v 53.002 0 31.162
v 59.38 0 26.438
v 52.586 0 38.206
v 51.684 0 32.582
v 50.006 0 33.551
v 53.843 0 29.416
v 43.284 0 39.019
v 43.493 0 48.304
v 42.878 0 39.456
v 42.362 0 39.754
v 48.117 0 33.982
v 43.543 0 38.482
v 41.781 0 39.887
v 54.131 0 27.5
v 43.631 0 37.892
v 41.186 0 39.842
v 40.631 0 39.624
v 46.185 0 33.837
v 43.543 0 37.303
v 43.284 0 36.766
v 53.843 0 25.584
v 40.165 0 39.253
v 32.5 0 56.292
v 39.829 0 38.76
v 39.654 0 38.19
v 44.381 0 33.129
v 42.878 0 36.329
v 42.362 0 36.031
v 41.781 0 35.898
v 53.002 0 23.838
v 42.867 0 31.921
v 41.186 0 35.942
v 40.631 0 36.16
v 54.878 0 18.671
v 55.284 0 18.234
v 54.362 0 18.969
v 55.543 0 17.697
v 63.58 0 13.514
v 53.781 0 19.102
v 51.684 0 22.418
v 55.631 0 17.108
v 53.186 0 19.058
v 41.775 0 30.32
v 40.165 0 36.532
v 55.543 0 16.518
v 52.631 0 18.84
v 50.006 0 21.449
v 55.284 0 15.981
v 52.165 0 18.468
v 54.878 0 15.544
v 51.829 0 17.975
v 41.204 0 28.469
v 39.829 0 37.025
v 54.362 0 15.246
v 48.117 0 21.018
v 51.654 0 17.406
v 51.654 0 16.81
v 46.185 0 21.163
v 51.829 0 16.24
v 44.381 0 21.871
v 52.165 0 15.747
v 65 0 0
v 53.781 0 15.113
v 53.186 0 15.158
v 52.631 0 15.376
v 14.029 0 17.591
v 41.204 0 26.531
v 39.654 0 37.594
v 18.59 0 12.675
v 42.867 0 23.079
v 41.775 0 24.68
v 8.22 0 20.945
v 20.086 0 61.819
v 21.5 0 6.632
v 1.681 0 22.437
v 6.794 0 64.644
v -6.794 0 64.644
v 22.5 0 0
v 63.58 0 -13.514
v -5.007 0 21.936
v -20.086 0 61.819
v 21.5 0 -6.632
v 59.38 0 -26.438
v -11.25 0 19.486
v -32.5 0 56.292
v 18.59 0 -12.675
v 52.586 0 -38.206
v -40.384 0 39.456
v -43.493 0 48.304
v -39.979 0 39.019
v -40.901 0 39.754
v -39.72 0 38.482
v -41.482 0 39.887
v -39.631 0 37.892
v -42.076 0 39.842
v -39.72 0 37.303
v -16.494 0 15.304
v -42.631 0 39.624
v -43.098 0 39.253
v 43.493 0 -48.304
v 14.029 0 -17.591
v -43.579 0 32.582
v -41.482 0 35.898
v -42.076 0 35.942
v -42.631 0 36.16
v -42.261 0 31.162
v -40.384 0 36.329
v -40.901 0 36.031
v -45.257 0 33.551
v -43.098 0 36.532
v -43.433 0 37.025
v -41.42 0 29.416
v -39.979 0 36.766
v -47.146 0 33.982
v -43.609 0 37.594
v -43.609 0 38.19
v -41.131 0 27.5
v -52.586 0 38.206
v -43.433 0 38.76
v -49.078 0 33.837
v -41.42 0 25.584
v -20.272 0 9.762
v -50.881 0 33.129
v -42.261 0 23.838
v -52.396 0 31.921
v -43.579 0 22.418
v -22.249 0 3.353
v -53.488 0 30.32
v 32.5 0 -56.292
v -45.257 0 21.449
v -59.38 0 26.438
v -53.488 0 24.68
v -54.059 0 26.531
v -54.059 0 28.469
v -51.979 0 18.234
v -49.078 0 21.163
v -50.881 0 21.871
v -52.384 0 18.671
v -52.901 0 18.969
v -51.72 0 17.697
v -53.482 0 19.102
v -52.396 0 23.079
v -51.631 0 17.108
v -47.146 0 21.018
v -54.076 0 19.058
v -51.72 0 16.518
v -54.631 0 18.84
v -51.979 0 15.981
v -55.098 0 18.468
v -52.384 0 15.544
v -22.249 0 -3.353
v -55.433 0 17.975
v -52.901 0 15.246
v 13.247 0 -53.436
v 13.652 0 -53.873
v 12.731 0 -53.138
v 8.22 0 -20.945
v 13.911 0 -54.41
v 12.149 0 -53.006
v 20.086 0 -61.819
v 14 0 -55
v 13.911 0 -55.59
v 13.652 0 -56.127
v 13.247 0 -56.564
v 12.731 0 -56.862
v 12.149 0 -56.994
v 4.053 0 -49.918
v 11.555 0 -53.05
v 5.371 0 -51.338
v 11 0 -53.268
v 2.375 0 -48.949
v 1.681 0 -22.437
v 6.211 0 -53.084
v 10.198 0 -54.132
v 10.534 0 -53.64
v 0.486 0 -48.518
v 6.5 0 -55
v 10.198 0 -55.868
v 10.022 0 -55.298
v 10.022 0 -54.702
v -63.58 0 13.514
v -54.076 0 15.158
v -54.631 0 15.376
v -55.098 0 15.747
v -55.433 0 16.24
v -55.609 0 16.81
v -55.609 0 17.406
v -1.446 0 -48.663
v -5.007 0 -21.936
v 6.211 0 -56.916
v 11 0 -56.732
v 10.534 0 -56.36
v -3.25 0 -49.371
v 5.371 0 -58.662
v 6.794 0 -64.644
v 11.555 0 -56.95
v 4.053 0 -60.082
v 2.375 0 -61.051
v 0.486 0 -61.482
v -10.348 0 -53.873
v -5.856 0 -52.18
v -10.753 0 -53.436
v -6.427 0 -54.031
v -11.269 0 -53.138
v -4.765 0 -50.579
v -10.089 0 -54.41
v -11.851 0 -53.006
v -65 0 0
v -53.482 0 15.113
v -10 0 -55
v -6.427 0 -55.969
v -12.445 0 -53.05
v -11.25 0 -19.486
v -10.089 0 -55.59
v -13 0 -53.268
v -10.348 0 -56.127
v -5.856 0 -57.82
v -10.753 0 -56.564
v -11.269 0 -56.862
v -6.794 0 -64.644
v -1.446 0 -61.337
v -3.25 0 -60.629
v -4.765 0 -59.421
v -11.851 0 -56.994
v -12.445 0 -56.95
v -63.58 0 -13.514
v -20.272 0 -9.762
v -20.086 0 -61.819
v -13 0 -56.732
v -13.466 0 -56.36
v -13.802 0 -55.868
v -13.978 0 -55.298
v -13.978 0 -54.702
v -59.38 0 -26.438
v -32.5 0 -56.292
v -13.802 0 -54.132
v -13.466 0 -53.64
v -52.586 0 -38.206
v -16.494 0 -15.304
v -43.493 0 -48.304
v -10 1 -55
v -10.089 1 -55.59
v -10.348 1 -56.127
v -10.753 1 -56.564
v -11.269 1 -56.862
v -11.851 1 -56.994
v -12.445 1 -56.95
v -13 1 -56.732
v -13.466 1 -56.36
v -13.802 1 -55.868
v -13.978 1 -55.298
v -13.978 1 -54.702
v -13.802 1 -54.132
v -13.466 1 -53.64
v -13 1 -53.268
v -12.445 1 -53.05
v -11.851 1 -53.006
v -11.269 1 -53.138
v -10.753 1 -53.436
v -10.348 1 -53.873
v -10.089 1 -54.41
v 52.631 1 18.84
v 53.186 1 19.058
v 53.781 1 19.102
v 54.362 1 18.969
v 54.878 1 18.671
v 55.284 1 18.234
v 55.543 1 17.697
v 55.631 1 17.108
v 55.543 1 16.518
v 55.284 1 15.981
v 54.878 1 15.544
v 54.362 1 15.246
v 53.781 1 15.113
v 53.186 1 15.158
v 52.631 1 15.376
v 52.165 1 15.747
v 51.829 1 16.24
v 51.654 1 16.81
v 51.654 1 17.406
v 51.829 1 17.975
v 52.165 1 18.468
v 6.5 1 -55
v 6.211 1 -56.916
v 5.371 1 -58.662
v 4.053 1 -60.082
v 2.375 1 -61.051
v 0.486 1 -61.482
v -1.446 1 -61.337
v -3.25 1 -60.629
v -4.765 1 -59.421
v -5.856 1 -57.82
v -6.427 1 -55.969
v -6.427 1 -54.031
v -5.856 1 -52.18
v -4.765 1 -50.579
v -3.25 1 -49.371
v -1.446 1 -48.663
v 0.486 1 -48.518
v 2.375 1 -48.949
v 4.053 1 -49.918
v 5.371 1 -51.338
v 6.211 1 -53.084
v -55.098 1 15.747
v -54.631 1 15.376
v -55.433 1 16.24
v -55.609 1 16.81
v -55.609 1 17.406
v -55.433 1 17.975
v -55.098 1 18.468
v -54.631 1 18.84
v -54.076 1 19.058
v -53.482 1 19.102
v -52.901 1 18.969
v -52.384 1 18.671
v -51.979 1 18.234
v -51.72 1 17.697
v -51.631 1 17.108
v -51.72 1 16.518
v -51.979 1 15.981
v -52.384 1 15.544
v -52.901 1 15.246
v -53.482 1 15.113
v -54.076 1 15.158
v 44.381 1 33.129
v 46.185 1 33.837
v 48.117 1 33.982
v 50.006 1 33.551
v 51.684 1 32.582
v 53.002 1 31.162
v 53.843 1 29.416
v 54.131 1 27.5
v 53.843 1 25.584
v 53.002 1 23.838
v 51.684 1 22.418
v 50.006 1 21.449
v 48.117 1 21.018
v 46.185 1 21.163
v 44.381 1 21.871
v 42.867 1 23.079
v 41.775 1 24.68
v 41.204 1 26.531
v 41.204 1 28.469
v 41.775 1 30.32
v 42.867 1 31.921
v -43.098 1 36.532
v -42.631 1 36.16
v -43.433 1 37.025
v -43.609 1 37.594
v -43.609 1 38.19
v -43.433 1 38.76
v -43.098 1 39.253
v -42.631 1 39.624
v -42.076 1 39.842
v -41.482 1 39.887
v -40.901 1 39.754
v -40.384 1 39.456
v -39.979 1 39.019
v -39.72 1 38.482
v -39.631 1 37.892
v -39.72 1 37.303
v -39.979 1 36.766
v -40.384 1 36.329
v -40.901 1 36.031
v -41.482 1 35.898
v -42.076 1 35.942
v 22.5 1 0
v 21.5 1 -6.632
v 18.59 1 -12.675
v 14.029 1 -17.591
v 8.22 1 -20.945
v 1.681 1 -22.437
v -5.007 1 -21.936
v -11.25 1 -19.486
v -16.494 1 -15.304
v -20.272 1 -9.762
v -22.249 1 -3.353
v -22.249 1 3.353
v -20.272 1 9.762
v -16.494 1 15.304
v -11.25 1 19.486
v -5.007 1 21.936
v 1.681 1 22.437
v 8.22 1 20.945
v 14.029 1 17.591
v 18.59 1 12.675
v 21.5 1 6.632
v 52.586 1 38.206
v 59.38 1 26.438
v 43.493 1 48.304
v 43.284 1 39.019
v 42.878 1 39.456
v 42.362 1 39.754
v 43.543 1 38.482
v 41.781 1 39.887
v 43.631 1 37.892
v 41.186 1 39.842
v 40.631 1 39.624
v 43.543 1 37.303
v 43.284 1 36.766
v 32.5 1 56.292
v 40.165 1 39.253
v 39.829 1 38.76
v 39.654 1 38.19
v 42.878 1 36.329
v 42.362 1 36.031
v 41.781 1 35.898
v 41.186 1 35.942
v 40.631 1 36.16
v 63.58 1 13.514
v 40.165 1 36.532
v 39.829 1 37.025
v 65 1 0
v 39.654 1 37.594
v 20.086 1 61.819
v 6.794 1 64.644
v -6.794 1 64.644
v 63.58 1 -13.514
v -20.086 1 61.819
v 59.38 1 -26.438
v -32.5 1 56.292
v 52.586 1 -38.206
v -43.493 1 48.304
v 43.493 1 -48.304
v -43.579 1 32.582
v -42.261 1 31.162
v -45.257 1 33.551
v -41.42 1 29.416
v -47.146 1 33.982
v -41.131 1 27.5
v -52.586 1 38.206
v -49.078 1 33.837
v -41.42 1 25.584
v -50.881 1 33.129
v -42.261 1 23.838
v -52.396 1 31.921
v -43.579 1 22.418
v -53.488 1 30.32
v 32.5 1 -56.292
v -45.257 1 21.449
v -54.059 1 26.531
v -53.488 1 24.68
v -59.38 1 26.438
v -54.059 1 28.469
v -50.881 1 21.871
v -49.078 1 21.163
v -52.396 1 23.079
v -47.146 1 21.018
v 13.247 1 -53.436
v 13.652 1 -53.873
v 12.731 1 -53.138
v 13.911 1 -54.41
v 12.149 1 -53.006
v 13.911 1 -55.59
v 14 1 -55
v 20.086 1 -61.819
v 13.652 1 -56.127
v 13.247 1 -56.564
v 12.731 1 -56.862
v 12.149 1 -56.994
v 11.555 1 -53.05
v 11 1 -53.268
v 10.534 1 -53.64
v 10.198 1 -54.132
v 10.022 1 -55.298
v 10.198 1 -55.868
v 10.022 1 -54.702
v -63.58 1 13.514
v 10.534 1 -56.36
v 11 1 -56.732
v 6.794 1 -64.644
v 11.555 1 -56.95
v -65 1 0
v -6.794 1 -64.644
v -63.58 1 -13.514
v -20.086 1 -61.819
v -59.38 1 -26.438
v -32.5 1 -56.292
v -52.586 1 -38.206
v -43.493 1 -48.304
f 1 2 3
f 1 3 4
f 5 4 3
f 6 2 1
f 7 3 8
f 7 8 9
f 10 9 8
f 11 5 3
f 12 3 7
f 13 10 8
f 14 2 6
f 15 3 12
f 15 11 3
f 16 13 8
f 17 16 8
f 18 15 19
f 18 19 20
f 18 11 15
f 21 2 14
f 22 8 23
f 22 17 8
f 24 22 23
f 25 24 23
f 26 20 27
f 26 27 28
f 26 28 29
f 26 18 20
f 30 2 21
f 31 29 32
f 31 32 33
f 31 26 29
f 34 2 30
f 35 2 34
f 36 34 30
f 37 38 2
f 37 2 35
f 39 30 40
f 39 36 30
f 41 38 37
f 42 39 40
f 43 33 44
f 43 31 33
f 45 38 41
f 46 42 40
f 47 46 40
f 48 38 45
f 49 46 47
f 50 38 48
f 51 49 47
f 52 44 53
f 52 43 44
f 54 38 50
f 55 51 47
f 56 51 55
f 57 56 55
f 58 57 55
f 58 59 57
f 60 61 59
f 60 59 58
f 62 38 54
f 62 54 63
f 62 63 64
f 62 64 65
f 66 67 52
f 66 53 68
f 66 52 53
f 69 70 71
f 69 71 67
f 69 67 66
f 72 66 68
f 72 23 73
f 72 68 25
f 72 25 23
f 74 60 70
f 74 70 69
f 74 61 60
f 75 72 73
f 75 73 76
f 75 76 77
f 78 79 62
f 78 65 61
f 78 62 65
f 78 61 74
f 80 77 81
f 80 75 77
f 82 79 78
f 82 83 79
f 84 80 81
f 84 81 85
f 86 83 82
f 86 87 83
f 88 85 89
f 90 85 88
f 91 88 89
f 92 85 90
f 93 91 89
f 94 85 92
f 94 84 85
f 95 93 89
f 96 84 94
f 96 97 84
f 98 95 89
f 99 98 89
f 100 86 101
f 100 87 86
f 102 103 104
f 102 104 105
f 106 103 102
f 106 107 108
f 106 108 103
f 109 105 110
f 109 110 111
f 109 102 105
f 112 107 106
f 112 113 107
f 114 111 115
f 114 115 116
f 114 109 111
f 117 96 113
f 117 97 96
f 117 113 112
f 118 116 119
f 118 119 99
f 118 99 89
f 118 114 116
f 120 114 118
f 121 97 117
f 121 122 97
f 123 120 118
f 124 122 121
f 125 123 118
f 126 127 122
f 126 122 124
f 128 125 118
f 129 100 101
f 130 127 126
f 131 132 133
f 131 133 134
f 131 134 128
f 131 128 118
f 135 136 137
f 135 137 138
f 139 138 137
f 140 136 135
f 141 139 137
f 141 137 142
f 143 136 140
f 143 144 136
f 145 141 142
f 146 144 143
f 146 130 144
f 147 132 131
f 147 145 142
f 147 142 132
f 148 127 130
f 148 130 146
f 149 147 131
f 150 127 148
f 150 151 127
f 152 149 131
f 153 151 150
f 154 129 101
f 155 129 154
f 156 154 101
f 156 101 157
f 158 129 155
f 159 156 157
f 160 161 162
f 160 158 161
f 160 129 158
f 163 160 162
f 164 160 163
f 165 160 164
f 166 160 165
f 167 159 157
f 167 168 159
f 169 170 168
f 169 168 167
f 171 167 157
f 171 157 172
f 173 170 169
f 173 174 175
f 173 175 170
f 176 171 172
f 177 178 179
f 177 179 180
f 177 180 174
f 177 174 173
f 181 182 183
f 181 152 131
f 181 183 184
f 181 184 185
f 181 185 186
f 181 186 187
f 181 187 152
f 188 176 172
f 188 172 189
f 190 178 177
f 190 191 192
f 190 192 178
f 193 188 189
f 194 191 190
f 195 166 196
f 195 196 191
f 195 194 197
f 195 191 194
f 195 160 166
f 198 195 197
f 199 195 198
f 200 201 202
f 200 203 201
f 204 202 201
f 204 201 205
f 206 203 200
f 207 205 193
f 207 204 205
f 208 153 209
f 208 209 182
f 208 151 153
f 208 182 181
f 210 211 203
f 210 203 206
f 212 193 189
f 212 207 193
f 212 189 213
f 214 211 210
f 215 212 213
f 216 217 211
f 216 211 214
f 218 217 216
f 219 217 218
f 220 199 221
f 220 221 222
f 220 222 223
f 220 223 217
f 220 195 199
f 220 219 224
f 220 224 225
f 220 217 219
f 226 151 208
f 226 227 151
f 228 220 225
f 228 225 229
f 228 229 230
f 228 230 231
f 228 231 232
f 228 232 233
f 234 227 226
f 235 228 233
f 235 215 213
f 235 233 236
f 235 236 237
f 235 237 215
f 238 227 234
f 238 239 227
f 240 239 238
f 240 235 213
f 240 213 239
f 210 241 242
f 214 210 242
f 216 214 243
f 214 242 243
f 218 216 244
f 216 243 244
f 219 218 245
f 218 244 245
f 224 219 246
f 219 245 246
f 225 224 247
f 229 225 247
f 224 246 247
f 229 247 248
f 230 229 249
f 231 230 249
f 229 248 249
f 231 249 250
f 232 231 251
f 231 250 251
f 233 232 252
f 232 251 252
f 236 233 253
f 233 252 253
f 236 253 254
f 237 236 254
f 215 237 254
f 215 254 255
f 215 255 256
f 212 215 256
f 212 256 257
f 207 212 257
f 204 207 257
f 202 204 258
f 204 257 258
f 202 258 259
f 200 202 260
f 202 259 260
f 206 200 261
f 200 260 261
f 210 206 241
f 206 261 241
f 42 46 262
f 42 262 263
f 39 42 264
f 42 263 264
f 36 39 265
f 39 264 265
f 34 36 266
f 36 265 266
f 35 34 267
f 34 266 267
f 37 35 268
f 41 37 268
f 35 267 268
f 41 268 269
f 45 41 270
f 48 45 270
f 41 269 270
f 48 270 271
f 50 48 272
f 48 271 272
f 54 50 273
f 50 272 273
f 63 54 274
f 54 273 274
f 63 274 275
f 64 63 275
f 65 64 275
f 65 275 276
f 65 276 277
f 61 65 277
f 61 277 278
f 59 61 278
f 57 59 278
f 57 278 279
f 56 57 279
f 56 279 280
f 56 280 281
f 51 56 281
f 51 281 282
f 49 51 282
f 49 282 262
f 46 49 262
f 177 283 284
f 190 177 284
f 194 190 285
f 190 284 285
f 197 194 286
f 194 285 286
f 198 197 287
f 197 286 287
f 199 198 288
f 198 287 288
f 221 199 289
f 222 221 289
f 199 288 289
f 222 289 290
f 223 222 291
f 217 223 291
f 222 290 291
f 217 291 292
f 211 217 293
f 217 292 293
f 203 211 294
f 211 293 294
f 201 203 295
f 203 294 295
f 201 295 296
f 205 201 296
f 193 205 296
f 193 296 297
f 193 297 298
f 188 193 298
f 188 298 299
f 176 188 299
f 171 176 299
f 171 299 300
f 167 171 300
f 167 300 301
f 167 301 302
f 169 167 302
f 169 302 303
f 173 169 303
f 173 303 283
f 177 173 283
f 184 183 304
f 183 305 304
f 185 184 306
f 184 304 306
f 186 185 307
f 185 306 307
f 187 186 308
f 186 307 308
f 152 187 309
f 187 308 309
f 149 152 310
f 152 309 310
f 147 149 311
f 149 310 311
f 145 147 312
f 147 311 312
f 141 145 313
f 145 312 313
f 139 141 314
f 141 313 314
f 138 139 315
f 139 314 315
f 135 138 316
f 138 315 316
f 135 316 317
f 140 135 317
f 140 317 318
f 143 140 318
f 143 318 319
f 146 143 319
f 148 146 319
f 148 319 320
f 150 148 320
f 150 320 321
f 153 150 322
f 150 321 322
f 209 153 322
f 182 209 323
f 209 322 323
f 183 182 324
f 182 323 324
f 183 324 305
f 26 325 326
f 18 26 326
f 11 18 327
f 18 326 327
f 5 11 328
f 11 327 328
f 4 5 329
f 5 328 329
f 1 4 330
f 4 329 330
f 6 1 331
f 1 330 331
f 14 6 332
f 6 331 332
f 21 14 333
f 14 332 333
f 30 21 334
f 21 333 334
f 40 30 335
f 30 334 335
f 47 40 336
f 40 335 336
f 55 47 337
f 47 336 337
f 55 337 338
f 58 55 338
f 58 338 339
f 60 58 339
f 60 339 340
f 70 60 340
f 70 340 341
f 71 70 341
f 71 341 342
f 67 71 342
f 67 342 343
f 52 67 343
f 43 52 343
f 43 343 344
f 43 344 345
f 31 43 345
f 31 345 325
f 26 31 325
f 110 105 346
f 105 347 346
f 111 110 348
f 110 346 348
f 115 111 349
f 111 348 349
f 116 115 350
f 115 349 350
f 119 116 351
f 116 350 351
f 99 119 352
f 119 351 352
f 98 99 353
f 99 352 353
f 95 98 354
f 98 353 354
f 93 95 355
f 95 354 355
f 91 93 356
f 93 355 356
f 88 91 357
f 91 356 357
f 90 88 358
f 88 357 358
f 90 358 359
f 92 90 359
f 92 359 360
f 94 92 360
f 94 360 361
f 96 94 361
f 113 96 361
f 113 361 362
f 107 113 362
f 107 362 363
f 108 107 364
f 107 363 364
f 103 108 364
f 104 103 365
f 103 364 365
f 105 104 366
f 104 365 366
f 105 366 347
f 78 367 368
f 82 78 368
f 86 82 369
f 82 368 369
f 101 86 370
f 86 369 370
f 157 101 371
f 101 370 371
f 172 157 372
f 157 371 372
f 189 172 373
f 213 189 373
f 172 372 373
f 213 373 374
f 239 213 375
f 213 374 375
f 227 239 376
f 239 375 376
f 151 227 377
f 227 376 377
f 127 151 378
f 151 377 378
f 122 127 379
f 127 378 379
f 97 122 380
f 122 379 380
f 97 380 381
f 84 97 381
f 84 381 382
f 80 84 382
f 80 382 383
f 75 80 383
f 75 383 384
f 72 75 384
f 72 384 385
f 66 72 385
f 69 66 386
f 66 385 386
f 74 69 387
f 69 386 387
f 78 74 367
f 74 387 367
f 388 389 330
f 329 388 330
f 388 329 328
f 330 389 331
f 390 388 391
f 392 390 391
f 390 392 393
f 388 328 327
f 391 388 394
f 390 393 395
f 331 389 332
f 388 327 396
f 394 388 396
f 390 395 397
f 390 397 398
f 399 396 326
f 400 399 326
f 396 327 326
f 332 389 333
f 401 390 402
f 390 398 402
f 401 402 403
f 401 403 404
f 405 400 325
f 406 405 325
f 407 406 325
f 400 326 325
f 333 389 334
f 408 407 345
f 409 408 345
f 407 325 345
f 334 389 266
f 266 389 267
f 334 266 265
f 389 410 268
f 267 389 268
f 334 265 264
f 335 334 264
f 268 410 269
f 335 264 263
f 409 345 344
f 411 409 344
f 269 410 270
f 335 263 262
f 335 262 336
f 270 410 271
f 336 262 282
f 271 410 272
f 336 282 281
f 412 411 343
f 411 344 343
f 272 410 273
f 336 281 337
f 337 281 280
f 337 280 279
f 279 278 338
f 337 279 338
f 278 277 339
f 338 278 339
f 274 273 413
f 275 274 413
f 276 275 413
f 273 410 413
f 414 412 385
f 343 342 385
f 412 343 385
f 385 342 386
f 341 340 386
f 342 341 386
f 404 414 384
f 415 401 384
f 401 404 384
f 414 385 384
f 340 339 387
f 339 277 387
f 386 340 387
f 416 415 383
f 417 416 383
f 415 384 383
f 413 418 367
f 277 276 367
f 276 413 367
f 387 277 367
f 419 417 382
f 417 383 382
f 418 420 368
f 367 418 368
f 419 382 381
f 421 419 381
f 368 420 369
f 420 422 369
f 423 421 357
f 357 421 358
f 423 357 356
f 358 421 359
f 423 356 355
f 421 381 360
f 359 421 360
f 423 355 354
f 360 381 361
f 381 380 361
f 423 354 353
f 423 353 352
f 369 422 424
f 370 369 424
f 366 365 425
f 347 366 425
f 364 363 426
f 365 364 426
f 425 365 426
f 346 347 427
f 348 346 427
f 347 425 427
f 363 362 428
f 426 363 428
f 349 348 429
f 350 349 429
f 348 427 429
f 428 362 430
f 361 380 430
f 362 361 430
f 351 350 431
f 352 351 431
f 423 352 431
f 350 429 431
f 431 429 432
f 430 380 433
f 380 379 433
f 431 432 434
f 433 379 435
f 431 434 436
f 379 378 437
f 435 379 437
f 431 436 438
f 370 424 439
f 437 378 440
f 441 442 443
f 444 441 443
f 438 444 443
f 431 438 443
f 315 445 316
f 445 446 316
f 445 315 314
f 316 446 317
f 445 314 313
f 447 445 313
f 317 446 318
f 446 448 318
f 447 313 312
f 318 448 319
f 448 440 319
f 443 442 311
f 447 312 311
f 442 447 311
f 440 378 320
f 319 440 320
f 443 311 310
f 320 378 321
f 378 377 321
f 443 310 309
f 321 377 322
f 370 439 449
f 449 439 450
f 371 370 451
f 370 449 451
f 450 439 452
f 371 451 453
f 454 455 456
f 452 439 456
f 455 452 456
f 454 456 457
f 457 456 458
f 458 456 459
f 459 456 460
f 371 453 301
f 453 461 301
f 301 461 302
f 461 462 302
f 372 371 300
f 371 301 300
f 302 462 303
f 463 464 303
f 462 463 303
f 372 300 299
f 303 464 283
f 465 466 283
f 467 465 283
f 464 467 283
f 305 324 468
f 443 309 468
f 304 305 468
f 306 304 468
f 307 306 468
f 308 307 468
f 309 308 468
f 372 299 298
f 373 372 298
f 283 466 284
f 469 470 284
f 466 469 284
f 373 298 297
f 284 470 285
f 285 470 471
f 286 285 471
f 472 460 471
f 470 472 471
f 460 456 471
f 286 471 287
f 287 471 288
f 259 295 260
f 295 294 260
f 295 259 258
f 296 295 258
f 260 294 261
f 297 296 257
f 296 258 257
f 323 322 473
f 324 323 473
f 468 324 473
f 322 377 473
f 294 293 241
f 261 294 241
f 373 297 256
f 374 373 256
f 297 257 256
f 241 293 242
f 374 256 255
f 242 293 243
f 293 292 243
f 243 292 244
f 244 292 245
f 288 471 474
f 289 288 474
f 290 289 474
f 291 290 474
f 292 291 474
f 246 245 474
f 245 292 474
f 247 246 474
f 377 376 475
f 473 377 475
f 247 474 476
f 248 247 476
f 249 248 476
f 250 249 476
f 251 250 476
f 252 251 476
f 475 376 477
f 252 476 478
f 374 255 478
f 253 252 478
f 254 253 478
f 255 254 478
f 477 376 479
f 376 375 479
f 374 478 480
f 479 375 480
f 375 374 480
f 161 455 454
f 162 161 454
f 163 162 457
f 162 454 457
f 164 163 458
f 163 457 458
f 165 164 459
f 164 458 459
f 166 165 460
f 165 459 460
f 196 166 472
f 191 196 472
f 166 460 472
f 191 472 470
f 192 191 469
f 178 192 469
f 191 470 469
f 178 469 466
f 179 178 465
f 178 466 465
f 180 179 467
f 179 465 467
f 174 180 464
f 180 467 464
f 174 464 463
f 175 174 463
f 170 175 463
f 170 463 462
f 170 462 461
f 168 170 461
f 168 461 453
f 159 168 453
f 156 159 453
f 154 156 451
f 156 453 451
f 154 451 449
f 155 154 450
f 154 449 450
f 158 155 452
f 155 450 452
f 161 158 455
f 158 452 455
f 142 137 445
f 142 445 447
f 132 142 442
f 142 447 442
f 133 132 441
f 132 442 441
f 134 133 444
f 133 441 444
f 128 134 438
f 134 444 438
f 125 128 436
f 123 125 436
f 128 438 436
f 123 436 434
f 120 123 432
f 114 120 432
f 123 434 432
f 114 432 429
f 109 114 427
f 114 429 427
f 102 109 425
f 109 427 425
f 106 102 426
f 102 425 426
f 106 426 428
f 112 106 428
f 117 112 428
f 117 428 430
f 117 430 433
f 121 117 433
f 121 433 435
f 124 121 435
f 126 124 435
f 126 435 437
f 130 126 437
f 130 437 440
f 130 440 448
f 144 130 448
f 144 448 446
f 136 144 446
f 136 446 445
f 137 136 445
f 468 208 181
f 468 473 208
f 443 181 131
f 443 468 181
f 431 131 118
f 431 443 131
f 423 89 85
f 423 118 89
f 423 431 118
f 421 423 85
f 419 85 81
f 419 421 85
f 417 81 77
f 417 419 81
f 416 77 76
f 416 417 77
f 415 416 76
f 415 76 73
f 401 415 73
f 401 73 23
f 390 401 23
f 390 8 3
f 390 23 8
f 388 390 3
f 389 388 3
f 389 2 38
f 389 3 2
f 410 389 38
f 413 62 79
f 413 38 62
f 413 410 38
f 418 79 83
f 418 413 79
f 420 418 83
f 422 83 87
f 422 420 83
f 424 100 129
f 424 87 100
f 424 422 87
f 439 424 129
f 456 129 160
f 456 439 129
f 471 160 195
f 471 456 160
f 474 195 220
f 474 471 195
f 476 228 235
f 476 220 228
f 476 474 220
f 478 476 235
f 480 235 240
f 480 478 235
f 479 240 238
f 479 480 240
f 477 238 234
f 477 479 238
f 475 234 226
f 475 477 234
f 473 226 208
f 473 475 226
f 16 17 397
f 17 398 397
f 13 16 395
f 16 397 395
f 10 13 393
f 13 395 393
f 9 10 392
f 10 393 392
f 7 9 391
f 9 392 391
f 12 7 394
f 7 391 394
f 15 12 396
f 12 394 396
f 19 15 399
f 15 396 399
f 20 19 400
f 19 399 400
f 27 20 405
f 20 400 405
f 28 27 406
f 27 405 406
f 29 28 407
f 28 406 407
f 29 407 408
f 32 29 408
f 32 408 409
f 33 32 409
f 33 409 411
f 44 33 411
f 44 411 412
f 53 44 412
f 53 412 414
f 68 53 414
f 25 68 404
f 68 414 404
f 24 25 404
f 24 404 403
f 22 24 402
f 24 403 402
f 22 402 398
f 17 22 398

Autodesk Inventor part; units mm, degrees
ref_plane "YZ Plane" through (0, 0, 0) normal (1, 0, 0) x (0, 1, 0)
ref_plane "XZ Plane" through (0, 0, 0) normal (0, 1, 0) x (-1, 0, 0)
ref_plane "XY Plane" through (0, 0, 0) normal (0, 0, 1) x (1, 0, 0)
sketch "Sketch1" plane through (0, 0, 0) normal (0, 0, 1) x (1, 0, 0)
  line L0 (0, 0) -> (-65, 0)
  line L1 (-65, 0) -> (-65, 1)
  line L2 (-65, 1) -> (0, 1)
  line L3 (0, 1) -> (0, 0)
  dimension "baffle_or" = 65
  dimension "d1" = 1
revolve "Revolution1" add sketch "Sketch1" angle 360 about axis through (0, 1, 0) along (0, -1, 0)
sketch "Sketch2" plane through (0, 1, 0) normal (0, 1, 0) x (1, 0, 0)
  circle A0 centre (0, 0) radius 22.5
  dimension "d3" = 45
extrude "Extrusion1" cut sketch "Sketch2" against normal through all
sketch "Sketch3" plane through (0, 1, 0) normal (0, 1, 0) x (1, 0, 0)
  circle A0 centre (0, 55) radius 6.5
  circle A1 centre (-12, 55) radius 2
  circle A2 centre (12, 55) radius 2
  point P0 (0, 0)
  dimension "d12" = 13
  dimension "tubes_r" = 55
  dimension "d14" = 4
  dimension "d15" = 12
  dimension "d16" = 4
  dimension "d17" = 12
extrude "Extrusion2" cut sketch "Sketch3" against normal through all
pattern_circular "Circular Pattern1" count 3 over 360 about axis through (0, 1, 0) along (0, -1, 0) of "Extrusion2"
equation "\"d17\" = d15"
properties part number "Baffle"
